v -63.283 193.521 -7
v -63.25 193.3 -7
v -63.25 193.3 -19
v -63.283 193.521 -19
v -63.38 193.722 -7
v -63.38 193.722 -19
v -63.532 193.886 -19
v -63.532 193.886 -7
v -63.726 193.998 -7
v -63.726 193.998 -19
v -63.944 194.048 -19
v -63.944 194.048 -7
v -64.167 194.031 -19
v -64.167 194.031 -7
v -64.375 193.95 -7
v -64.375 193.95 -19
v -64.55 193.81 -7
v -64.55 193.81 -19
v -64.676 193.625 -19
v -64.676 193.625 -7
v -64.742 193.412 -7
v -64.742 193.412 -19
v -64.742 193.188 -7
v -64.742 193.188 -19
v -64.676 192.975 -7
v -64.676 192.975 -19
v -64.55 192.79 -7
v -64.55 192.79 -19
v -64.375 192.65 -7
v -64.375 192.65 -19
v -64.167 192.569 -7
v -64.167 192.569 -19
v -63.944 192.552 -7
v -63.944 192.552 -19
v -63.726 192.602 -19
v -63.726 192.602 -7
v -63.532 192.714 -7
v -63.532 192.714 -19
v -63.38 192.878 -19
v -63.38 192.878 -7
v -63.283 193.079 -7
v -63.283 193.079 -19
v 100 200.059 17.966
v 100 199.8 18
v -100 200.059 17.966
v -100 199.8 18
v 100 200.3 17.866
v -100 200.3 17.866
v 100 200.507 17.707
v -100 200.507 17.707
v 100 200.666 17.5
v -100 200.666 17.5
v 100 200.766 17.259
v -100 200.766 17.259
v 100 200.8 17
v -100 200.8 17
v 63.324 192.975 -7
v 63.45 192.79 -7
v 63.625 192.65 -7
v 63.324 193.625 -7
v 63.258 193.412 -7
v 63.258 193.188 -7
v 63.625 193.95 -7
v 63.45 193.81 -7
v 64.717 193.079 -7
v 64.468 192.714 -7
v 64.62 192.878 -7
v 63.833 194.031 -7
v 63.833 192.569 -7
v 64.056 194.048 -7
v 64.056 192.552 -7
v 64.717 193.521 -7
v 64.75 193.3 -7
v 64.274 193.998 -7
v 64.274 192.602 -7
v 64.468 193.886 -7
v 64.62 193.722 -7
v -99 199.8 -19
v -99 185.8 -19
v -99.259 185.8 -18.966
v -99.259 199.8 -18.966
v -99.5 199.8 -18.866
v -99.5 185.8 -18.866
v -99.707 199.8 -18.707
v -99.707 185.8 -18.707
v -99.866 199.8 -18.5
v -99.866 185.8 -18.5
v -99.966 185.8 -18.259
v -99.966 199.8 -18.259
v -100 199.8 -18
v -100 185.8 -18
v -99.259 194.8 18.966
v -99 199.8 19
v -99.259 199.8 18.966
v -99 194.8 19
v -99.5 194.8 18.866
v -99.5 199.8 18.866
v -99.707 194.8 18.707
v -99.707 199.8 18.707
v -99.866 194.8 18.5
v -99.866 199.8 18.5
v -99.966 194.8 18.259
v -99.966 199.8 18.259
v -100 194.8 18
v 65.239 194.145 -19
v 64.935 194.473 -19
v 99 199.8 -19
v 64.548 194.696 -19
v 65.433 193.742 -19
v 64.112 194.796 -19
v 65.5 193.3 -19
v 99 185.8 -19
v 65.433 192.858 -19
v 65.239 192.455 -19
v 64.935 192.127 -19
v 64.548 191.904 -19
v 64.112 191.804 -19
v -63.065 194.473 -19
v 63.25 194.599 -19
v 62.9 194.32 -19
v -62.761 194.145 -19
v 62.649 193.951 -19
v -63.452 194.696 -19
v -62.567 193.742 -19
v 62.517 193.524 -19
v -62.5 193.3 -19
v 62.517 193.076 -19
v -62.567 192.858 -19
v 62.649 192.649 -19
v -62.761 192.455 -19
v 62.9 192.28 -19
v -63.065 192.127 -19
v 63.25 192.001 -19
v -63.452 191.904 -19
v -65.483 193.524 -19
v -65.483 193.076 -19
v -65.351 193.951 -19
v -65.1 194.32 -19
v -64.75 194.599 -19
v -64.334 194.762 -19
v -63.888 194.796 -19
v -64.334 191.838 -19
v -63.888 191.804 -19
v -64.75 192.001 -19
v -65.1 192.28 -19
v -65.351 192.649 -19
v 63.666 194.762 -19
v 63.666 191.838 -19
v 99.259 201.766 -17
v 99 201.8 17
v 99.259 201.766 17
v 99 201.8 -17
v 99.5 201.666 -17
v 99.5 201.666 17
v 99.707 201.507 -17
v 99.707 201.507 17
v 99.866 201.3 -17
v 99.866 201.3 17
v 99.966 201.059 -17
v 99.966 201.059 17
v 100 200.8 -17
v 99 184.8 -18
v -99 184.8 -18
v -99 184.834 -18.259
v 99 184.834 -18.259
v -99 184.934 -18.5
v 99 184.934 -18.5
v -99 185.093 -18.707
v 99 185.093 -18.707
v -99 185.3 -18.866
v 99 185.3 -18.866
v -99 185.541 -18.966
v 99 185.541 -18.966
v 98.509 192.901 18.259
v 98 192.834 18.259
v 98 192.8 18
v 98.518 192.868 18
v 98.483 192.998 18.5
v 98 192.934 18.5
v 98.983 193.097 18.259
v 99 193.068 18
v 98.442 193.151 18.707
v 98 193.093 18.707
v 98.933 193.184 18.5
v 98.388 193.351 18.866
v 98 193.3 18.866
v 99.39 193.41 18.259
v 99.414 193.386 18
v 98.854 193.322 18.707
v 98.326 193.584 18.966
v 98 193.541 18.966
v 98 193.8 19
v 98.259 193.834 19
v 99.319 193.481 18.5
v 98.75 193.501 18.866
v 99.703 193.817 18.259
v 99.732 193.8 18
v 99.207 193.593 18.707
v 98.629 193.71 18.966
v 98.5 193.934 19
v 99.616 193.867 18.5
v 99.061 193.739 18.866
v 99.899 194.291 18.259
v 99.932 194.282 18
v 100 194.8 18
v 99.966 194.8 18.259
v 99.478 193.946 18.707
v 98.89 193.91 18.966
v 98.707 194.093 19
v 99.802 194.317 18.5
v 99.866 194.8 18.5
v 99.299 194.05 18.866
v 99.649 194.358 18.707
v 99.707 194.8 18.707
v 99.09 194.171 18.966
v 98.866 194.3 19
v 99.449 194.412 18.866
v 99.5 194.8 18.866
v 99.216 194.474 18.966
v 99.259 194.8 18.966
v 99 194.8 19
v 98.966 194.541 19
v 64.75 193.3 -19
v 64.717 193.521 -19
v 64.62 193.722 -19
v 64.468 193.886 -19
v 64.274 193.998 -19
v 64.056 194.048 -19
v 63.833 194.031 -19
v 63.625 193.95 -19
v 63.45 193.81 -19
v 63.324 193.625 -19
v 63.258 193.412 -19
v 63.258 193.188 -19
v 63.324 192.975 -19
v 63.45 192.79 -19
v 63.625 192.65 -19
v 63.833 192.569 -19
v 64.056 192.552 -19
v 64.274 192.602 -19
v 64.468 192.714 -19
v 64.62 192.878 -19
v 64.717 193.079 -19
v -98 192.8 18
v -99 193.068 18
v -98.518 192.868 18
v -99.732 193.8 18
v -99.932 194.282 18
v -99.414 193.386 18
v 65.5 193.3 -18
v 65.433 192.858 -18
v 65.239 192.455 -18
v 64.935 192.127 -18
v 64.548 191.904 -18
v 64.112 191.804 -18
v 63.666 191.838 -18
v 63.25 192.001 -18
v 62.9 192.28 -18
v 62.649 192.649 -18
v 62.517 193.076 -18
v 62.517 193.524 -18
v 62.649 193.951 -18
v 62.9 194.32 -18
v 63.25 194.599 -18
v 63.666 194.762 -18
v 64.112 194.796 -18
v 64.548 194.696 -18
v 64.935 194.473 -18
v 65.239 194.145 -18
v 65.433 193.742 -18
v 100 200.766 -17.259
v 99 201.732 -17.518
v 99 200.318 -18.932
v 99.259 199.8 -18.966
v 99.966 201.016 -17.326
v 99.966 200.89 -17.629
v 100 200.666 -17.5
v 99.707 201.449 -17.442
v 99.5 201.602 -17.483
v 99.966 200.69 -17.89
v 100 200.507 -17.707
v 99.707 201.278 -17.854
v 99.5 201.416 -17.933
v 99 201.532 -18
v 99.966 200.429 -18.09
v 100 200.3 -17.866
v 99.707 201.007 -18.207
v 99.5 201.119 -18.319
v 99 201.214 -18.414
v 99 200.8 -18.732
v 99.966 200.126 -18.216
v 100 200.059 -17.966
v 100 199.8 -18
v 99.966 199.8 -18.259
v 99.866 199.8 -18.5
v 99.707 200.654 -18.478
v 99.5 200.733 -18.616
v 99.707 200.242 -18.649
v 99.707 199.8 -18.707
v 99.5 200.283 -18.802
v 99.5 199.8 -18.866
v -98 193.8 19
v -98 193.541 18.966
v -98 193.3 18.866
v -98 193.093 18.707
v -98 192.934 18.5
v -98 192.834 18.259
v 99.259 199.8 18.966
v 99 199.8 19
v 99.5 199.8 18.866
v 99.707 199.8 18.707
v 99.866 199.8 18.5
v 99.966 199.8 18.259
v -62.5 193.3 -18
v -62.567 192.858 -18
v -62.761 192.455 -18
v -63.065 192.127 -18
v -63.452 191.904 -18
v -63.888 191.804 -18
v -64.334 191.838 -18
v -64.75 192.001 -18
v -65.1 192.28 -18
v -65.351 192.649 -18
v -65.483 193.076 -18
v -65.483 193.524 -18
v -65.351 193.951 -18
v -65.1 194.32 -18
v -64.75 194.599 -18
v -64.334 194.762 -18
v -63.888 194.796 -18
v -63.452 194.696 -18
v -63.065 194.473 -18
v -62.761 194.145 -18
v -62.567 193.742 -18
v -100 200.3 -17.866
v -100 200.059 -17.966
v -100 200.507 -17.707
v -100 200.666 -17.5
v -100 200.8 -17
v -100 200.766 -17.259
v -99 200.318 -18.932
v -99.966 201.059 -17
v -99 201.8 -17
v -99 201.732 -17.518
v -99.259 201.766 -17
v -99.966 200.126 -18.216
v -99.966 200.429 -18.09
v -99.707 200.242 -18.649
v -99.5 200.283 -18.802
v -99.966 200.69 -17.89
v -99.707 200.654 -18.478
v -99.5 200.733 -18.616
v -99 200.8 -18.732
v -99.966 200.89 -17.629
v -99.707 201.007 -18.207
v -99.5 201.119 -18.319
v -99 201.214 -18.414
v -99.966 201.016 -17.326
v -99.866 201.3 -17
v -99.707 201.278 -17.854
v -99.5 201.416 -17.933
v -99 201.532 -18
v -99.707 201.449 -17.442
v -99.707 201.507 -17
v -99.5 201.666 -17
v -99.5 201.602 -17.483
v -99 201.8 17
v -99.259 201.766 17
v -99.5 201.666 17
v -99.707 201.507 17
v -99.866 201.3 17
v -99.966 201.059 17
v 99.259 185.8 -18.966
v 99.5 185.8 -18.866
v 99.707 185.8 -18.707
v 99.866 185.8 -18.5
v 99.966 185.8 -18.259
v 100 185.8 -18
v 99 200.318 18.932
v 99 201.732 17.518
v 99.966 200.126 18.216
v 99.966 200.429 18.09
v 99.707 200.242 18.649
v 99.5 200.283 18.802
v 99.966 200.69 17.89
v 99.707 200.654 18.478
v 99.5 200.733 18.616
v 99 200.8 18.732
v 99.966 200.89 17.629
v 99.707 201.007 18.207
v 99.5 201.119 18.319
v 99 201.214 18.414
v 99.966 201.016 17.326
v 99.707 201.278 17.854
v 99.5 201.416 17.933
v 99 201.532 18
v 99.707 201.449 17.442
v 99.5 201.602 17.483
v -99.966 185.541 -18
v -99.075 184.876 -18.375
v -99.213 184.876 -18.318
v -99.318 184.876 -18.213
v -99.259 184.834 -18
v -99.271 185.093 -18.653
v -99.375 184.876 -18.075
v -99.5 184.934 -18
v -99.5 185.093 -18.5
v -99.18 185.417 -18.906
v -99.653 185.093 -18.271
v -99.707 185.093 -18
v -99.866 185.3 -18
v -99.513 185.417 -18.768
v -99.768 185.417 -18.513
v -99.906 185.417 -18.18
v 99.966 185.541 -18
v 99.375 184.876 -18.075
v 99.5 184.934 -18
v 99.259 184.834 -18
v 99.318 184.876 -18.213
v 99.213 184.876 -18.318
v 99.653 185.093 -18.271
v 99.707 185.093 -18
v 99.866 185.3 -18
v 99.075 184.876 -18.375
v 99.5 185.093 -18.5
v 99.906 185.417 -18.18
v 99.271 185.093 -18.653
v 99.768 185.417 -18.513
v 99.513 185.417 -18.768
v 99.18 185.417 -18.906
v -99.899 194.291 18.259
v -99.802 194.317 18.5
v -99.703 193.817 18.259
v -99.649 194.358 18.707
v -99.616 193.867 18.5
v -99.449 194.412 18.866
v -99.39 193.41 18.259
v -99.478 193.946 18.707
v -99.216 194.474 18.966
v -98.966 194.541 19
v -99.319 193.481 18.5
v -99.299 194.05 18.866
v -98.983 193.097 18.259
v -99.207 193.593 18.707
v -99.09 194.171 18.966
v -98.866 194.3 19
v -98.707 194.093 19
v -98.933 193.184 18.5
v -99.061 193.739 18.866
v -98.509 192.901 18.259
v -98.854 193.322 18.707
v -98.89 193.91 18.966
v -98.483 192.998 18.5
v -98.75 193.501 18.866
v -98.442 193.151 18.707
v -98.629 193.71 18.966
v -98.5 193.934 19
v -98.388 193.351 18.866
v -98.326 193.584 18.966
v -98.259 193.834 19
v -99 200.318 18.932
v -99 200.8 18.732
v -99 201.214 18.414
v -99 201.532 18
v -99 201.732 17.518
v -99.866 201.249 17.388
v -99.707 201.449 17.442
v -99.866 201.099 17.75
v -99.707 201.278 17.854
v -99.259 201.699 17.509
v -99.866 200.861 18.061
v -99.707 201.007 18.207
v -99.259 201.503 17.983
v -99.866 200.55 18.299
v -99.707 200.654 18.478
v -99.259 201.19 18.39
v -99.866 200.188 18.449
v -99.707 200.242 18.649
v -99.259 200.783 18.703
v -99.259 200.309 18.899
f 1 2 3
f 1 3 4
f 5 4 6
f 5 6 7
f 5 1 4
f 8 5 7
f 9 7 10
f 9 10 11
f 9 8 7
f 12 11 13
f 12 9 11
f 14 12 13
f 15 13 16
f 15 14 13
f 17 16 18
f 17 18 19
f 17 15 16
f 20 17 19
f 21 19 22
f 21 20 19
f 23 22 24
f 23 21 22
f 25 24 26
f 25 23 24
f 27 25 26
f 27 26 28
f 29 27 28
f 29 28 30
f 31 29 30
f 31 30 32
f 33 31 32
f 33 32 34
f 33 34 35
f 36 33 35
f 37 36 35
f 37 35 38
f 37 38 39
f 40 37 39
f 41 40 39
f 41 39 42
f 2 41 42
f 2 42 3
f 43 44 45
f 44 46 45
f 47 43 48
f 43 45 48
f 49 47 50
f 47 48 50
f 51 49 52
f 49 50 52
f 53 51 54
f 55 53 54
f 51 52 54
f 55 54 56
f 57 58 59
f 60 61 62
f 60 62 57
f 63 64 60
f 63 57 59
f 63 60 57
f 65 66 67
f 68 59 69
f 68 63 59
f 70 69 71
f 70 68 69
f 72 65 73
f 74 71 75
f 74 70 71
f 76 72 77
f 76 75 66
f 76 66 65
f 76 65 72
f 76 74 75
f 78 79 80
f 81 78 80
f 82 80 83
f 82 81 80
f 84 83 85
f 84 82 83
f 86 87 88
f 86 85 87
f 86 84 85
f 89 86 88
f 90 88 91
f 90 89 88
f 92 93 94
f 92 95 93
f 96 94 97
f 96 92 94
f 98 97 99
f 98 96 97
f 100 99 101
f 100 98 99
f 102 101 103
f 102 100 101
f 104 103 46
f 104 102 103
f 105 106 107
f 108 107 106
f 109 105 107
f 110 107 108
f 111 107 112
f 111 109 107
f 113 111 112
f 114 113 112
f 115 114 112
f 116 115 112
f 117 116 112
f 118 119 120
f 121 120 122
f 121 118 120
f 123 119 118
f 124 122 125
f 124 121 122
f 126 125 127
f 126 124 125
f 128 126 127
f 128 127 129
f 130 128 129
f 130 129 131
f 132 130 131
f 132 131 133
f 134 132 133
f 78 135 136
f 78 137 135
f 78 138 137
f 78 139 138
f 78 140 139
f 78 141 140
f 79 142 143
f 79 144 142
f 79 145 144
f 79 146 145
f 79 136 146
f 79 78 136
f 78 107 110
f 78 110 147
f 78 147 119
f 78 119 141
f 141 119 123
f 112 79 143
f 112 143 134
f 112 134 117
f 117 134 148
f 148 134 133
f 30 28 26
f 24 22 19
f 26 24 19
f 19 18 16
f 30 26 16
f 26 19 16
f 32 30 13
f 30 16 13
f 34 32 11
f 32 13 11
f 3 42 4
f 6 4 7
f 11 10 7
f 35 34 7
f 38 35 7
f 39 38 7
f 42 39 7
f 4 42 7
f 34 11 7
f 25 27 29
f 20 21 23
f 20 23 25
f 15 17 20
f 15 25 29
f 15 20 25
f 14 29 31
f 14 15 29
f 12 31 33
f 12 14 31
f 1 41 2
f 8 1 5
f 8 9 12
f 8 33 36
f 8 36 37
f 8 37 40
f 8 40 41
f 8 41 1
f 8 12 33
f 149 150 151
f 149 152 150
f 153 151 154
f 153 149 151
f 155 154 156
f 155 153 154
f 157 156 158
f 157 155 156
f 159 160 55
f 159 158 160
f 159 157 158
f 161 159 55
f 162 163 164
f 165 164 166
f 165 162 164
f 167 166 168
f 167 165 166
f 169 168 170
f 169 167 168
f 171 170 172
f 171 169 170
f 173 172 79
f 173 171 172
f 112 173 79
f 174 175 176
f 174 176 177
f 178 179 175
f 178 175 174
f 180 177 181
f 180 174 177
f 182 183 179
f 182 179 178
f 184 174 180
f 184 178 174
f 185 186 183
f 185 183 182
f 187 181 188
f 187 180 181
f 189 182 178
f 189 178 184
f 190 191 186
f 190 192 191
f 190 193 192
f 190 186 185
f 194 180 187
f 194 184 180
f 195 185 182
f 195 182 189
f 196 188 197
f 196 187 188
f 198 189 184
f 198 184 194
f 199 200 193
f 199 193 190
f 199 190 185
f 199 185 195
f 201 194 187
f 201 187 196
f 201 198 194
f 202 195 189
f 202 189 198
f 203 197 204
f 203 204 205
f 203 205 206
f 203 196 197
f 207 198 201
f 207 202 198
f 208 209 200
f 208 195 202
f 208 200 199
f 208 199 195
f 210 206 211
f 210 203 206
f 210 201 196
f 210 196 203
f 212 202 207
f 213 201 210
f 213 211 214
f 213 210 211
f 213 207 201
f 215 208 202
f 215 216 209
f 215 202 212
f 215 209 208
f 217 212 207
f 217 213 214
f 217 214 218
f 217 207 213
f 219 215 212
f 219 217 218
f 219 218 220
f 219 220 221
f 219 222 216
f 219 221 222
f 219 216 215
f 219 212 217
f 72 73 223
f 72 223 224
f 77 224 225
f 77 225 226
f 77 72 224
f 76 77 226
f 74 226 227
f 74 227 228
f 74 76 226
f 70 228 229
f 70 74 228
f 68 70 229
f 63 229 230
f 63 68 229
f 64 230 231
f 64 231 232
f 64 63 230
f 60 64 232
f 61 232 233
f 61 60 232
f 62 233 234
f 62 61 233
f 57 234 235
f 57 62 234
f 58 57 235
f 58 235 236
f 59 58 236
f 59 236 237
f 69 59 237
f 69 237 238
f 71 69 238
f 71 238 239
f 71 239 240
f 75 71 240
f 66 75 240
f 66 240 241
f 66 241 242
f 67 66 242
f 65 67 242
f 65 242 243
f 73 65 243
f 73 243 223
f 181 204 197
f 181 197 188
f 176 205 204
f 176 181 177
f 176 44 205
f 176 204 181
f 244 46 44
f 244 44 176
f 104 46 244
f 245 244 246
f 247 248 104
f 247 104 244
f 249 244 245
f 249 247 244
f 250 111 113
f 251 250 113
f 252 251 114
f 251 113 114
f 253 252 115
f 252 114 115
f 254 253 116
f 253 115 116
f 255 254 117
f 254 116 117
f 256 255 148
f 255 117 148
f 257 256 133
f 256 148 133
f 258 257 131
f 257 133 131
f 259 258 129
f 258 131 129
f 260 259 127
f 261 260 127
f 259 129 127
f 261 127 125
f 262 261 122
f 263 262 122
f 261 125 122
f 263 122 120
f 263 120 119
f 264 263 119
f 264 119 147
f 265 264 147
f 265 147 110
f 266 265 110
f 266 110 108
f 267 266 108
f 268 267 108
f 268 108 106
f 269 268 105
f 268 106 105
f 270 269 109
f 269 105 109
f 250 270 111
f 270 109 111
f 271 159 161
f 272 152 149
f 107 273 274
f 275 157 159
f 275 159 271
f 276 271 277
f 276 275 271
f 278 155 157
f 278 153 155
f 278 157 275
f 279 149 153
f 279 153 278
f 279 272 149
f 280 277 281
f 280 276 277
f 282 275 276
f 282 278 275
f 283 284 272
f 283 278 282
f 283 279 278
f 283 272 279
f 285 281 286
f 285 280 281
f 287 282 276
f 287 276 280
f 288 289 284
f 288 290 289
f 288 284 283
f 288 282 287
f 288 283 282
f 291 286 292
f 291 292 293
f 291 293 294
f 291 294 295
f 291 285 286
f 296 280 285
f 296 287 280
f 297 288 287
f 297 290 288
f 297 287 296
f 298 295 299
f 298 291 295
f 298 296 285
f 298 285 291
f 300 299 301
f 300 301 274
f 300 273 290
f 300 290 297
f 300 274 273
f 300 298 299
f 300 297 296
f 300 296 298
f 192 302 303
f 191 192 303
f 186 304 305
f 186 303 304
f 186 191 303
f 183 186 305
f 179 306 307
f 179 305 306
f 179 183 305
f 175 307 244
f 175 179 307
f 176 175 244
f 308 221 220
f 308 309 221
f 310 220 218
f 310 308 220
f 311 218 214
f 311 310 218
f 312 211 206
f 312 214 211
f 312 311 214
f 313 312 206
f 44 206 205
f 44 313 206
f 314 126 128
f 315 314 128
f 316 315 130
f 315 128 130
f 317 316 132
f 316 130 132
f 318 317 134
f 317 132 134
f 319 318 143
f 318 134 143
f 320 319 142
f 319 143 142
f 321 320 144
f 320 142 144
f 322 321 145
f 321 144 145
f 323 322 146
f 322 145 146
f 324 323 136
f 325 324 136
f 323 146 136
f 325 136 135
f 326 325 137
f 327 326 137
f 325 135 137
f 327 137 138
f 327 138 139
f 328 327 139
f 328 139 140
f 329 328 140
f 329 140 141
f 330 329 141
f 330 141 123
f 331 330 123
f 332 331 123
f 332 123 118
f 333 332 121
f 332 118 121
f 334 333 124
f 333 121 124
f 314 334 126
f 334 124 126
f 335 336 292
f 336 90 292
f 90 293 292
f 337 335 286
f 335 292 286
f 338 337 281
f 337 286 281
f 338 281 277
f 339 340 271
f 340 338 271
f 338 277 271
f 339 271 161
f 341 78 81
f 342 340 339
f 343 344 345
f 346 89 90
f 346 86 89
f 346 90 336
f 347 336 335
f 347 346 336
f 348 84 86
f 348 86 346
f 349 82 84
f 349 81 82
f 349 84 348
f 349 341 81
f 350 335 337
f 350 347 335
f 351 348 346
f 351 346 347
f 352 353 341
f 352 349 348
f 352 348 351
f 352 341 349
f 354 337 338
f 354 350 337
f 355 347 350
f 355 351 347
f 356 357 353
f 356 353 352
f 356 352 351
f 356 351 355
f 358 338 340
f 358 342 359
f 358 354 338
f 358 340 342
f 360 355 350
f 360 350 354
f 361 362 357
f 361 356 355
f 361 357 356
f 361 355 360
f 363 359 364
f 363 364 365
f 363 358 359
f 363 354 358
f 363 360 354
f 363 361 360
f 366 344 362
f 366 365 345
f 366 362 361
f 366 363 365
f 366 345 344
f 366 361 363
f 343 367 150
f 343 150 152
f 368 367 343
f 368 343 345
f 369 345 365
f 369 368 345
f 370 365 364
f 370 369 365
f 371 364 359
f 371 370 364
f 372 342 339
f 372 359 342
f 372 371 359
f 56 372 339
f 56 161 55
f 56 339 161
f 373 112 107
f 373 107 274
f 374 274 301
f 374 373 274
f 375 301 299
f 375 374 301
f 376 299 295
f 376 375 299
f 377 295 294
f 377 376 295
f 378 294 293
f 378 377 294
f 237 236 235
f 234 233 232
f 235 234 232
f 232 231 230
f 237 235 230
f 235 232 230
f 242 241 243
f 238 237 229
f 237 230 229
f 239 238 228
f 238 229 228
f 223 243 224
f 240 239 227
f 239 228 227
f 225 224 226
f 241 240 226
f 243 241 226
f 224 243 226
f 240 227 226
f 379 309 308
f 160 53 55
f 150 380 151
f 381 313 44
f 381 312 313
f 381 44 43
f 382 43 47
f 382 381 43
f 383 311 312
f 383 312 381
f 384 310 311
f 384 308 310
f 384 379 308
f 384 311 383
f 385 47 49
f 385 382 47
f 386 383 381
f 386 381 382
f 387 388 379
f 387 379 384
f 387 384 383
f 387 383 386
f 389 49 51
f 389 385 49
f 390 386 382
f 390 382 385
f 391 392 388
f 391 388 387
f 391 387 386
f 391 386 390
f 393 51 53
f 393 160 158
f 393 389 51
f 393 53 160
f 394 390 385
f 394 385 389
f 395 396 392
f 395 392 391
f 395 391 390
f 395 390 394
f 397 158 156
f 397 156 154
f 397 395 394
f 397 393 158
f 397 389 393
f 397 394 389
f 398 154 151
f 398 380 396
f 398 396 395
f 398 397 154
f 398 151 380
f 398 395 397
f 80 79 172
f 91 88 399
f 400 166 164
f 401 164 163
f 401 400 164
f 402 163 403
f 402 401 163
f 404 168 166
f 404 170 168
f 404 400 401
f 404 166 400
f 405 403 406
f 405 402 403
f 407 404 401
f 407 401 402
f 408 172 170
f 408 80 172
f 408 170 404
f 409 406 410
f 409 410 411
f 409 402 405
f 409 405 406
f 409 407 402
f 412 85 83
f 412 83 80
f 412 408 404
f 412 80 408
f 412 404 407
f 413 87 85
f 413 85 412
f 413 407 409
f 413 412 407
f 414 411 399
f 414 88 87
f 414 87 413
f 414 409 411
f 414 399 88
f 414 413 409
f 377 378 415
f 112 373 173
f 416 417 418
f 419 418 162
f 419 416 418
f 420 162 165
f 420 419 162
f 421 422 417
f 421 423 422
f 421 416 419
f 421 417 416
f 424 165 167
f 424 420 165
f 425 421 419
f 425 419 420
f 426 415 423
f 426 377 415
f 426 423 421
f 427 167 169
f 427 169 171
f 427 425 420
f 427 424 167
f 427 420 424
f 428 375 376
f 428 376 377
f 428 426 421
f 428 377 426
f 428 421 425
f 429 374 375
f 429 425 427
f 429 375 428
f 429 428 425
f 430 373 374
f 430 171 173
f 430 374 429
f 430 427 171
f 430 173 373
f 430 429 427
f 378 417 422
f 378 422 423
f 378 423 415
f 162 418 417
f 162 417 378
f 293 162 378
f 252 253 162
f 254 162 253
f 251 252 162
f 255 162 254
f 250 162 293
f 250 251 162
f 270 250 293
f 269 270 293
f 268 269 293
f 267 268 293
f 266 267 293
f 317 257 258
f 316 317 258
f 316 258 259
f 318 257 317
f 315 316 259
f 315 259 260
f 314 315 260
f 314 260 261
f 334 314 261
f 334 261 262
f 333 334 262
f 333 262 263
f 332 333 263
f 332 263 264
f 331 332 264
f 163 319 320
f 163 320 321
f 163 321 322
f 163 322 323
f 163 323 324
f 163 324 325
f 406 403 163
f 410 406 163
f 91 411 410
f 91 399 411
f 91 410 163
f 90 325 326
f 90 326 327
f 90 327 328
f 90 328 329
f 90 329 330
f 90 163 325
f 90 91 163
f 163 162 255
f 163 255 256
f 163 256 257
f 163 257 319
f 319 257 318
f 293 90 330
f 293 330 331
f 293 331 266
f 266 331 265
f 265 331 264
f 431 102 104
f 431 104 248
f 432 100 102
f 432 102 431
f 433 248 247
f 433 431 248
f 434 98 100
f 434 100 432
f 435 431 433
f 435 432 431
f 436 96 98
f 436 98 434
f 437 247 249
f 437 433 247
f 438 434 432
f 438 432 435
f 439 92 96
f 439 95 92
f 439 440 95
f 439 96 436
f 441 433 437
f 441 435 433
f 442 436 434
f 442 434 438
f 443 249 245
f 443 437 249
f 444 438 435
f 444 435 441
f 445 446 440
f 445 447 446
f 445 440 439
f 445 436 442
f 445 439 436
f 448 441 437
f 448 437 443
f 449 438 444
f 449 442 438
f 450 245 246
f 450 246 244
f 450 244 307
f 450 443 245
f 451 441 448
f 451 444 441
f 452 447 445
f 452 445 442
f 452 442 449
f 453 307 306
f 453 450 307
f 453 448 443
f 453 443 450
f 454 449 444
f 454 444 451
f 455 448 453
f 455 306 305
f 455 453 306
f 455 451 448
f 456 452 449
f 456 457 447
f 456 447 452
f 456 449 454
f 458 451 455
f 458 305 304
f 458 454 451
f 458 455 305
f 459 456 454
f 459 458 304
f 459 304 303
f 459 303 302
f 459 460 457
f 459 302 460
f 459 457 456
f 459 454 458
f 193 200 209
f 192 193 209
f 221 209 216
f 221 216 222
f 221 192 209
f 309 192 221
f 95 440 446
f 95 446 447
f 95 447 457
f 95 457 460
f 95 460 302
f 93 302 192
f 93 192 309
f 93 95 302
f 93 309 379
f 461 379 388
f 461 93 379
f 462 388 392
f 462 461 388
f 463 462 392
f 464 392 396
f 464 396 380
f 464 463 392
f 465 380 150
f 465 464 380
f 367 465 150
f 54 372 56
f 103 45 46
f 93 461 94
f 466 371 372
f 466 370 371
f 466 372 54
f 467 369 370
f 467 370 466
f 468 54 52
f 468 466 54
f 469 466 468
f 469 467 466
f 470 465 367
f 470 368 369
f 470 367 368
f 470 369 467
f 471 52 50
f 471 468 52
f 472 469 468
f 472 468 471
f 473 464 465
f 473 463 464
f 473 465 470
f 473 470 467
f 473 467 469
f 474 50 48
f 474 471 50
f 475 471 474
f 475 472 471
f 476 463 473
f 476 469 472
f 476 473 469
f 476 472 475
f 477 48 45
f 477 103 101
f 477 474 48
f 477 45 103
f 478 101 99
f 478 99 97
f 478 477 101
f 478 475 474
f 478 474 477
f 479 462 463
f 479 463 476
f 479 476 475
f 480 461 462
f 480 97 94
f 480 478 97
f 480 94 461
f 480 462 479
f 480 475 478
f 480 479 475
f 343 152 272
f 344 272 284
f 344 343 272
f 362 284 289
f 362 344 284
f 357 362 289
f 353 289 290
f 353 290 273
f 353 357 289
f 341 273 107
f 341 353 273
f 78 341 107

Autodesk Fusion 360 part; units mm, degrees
sketch "Facade" plane through (0, 0, 0) normal (0, 0, 1) x (1, 0, 0)
  line L0 (150, -200) -> (-150, -200)
  line L1 (-150, -200) -> (-150, 200)
  line L2 (-150, 200) -> (150, 200)
  line L3 (150, 200) -> (150, -200)
  line L4 (150, -200) -> (-150, 200) construction
  line L5 (-150, -200) -> (150, 200) construction
  dimension "d4" = 400
  dimension "d5" = 300
sketch "Sketch7" plane through (0, 0, 0) normal (1, 0, 0) x (0, 0, -1)
  line L0 (0, -200) -> (0, 200)
  line L1 (18, 200.8) -> (-18, 200.8)
  line L2 (-18, 200.8) -> (-18, 192.8)
  line L3 (-18, 192.8) -> (-19, 192.8)
  line L4 (-19, 192.8) -> (-19, 201.8)
  line L5 (-19, 201.8) -> (19, 201.8)
  line L6 (19, 201.8) -> (19, 184.8)
  line L7 (19, 184.8) -> (18, 184.8)
  line L8 (18, 184.8) -> (18, 200.8)
  point P0 (0, 200)
  point P1 (0, 200.8)
  point P2 (0, 200)
  dimension "d52" = 18
  dimension "d53" = 36
  dimension "d54" = 1
  dimension "d55" = 1
  dimension "d56" = 1
  dimension "d58" = 8
  dimension "d59" = 0.8
  dimension "d74" = 17
extrude "Extrude7" add sketch "Sketch7" along normal mid plane 200 makes body 1
fillet "Fillet2" radius 2 2 edges at (0, 201.8, -19) (0, 201.8, 19) on bodies 1
fillet "Fillet3" radius 2 2 edges at (-100, 192.8, 18.5) (100, 192.8, 18.5) on bodies 1
fillet "Fillet4" radius 1 2 edges at (0, 200.8, -18) (0, 200.8, 18) on bodies 1
fillet "Fillet5" radius 1 13 edges at (100, 192.3, -19) (100, 201.2142, -18.4142) (100, 201.8, 0) (100, 201.2142, 18.4142) (100, 197.3, 19) (99.4142, 193.3858, 19) (0, 192.8, 19) (-99.4142, 193.3858, 19) (-100, 197.3, 19) (-100, 201.2142, 18.4142) (-100, 201.8, 0) (-100, 201.2142, -18.4142) (-100, 192.3, -19) on bodies 1
fillet "Fillet6" radius 1 3 edges at (-99.7071, 184.8, -18.7071) (0, 184.8, -19) (99.7071, 184.8, -18.7071) on bodies 1
sketch "Sketch8" plane through (0, 0, -19) normal (0, 0, -1) x (1, 0, 0)
  line L0 (99, -185.8) -> (-99, -185.8)
  line L1 (-99, -185.8) -> (-99, -199.8)
  line L2 (-99, -199.8) -> (99, -199.8)
  line L3 (99, -199.8) -> (99, -185.8)
  line L4 (64, -193.3) -> (-64, -193.3) construction
  line L5 (-99, -201.8) -> (99, -201.8) construction
  circle A0 centre (64, -193.3) radius 1.5
  circle A1 centre (-64, -193.3) radius 1.5
  point P0 (0, -193.3)
  dimension "d73" = 8.5
  dimension "d76" = 128
  dimension "d77" = 3
  dimension "d78" = 3
extrude "Extrude8" cut sketch "Sketch8" against normal up to surface (1 mm away) contours A0 | A1 bodies 1
sketch "Sketch9" plane through (0, 0, 0) normal (0, 0, 1) x (1, 0, 0)
  circle A0 centre (-64, 193.3) radius 1.5
  circle A1 centre (64, 193.3) radius 1.5
  circle A2 centre (-64, 193.3) radius 0.75
  circle A3 centre (64, 193.3) radius 0.75
  dimension "d81" = 1.5
  dimension "d82" = 1.5
extrude "Extrude9" add sketch "Sketch9" along normal blind -19 and the other way blind 7 separate body contours A2 makes body 2
extrude "Extrude10" add sketch "Sketch9" along normal blind -19 and the other way blind 7 separate body contours A3 makes body 3
equation "FacadeWidth = 300 mm"
equation "FacadeHeight = 400 mm"
equation "d4 = FacadeHeight"
equation "d5 = FacadeWidth"
equation "Gap = 0.8 mm" comment "If gap is needed, please enter 20 mm"
equation "FacadeThickness = 18 mm"
equation "d52 = FacadeThickness"
equation "d53 = FacadeThickness * 2"
equation "d55 = d54"
equation "d56 = d55"
equation "d59 = Gap"
equation "HandleLength = 200 mm" comment "Possible lengths:50; 100; 200; 400; 800;1100"
equation "d61 = HandleLength"
equation "C2 = ( if(HandleLength == 50 mm; 32; if(HandleLength == 100 mm; 64; if(HandleLength == 200 mm; 128; if(HandleLength == 400 mm; 320; if(HandleLength == 800 mm; 736; if(HandleLength == 1100 mm; 1056; 32)))))) ) * 1 mm"
equation "d76 = C2"
properties part number "Way"
